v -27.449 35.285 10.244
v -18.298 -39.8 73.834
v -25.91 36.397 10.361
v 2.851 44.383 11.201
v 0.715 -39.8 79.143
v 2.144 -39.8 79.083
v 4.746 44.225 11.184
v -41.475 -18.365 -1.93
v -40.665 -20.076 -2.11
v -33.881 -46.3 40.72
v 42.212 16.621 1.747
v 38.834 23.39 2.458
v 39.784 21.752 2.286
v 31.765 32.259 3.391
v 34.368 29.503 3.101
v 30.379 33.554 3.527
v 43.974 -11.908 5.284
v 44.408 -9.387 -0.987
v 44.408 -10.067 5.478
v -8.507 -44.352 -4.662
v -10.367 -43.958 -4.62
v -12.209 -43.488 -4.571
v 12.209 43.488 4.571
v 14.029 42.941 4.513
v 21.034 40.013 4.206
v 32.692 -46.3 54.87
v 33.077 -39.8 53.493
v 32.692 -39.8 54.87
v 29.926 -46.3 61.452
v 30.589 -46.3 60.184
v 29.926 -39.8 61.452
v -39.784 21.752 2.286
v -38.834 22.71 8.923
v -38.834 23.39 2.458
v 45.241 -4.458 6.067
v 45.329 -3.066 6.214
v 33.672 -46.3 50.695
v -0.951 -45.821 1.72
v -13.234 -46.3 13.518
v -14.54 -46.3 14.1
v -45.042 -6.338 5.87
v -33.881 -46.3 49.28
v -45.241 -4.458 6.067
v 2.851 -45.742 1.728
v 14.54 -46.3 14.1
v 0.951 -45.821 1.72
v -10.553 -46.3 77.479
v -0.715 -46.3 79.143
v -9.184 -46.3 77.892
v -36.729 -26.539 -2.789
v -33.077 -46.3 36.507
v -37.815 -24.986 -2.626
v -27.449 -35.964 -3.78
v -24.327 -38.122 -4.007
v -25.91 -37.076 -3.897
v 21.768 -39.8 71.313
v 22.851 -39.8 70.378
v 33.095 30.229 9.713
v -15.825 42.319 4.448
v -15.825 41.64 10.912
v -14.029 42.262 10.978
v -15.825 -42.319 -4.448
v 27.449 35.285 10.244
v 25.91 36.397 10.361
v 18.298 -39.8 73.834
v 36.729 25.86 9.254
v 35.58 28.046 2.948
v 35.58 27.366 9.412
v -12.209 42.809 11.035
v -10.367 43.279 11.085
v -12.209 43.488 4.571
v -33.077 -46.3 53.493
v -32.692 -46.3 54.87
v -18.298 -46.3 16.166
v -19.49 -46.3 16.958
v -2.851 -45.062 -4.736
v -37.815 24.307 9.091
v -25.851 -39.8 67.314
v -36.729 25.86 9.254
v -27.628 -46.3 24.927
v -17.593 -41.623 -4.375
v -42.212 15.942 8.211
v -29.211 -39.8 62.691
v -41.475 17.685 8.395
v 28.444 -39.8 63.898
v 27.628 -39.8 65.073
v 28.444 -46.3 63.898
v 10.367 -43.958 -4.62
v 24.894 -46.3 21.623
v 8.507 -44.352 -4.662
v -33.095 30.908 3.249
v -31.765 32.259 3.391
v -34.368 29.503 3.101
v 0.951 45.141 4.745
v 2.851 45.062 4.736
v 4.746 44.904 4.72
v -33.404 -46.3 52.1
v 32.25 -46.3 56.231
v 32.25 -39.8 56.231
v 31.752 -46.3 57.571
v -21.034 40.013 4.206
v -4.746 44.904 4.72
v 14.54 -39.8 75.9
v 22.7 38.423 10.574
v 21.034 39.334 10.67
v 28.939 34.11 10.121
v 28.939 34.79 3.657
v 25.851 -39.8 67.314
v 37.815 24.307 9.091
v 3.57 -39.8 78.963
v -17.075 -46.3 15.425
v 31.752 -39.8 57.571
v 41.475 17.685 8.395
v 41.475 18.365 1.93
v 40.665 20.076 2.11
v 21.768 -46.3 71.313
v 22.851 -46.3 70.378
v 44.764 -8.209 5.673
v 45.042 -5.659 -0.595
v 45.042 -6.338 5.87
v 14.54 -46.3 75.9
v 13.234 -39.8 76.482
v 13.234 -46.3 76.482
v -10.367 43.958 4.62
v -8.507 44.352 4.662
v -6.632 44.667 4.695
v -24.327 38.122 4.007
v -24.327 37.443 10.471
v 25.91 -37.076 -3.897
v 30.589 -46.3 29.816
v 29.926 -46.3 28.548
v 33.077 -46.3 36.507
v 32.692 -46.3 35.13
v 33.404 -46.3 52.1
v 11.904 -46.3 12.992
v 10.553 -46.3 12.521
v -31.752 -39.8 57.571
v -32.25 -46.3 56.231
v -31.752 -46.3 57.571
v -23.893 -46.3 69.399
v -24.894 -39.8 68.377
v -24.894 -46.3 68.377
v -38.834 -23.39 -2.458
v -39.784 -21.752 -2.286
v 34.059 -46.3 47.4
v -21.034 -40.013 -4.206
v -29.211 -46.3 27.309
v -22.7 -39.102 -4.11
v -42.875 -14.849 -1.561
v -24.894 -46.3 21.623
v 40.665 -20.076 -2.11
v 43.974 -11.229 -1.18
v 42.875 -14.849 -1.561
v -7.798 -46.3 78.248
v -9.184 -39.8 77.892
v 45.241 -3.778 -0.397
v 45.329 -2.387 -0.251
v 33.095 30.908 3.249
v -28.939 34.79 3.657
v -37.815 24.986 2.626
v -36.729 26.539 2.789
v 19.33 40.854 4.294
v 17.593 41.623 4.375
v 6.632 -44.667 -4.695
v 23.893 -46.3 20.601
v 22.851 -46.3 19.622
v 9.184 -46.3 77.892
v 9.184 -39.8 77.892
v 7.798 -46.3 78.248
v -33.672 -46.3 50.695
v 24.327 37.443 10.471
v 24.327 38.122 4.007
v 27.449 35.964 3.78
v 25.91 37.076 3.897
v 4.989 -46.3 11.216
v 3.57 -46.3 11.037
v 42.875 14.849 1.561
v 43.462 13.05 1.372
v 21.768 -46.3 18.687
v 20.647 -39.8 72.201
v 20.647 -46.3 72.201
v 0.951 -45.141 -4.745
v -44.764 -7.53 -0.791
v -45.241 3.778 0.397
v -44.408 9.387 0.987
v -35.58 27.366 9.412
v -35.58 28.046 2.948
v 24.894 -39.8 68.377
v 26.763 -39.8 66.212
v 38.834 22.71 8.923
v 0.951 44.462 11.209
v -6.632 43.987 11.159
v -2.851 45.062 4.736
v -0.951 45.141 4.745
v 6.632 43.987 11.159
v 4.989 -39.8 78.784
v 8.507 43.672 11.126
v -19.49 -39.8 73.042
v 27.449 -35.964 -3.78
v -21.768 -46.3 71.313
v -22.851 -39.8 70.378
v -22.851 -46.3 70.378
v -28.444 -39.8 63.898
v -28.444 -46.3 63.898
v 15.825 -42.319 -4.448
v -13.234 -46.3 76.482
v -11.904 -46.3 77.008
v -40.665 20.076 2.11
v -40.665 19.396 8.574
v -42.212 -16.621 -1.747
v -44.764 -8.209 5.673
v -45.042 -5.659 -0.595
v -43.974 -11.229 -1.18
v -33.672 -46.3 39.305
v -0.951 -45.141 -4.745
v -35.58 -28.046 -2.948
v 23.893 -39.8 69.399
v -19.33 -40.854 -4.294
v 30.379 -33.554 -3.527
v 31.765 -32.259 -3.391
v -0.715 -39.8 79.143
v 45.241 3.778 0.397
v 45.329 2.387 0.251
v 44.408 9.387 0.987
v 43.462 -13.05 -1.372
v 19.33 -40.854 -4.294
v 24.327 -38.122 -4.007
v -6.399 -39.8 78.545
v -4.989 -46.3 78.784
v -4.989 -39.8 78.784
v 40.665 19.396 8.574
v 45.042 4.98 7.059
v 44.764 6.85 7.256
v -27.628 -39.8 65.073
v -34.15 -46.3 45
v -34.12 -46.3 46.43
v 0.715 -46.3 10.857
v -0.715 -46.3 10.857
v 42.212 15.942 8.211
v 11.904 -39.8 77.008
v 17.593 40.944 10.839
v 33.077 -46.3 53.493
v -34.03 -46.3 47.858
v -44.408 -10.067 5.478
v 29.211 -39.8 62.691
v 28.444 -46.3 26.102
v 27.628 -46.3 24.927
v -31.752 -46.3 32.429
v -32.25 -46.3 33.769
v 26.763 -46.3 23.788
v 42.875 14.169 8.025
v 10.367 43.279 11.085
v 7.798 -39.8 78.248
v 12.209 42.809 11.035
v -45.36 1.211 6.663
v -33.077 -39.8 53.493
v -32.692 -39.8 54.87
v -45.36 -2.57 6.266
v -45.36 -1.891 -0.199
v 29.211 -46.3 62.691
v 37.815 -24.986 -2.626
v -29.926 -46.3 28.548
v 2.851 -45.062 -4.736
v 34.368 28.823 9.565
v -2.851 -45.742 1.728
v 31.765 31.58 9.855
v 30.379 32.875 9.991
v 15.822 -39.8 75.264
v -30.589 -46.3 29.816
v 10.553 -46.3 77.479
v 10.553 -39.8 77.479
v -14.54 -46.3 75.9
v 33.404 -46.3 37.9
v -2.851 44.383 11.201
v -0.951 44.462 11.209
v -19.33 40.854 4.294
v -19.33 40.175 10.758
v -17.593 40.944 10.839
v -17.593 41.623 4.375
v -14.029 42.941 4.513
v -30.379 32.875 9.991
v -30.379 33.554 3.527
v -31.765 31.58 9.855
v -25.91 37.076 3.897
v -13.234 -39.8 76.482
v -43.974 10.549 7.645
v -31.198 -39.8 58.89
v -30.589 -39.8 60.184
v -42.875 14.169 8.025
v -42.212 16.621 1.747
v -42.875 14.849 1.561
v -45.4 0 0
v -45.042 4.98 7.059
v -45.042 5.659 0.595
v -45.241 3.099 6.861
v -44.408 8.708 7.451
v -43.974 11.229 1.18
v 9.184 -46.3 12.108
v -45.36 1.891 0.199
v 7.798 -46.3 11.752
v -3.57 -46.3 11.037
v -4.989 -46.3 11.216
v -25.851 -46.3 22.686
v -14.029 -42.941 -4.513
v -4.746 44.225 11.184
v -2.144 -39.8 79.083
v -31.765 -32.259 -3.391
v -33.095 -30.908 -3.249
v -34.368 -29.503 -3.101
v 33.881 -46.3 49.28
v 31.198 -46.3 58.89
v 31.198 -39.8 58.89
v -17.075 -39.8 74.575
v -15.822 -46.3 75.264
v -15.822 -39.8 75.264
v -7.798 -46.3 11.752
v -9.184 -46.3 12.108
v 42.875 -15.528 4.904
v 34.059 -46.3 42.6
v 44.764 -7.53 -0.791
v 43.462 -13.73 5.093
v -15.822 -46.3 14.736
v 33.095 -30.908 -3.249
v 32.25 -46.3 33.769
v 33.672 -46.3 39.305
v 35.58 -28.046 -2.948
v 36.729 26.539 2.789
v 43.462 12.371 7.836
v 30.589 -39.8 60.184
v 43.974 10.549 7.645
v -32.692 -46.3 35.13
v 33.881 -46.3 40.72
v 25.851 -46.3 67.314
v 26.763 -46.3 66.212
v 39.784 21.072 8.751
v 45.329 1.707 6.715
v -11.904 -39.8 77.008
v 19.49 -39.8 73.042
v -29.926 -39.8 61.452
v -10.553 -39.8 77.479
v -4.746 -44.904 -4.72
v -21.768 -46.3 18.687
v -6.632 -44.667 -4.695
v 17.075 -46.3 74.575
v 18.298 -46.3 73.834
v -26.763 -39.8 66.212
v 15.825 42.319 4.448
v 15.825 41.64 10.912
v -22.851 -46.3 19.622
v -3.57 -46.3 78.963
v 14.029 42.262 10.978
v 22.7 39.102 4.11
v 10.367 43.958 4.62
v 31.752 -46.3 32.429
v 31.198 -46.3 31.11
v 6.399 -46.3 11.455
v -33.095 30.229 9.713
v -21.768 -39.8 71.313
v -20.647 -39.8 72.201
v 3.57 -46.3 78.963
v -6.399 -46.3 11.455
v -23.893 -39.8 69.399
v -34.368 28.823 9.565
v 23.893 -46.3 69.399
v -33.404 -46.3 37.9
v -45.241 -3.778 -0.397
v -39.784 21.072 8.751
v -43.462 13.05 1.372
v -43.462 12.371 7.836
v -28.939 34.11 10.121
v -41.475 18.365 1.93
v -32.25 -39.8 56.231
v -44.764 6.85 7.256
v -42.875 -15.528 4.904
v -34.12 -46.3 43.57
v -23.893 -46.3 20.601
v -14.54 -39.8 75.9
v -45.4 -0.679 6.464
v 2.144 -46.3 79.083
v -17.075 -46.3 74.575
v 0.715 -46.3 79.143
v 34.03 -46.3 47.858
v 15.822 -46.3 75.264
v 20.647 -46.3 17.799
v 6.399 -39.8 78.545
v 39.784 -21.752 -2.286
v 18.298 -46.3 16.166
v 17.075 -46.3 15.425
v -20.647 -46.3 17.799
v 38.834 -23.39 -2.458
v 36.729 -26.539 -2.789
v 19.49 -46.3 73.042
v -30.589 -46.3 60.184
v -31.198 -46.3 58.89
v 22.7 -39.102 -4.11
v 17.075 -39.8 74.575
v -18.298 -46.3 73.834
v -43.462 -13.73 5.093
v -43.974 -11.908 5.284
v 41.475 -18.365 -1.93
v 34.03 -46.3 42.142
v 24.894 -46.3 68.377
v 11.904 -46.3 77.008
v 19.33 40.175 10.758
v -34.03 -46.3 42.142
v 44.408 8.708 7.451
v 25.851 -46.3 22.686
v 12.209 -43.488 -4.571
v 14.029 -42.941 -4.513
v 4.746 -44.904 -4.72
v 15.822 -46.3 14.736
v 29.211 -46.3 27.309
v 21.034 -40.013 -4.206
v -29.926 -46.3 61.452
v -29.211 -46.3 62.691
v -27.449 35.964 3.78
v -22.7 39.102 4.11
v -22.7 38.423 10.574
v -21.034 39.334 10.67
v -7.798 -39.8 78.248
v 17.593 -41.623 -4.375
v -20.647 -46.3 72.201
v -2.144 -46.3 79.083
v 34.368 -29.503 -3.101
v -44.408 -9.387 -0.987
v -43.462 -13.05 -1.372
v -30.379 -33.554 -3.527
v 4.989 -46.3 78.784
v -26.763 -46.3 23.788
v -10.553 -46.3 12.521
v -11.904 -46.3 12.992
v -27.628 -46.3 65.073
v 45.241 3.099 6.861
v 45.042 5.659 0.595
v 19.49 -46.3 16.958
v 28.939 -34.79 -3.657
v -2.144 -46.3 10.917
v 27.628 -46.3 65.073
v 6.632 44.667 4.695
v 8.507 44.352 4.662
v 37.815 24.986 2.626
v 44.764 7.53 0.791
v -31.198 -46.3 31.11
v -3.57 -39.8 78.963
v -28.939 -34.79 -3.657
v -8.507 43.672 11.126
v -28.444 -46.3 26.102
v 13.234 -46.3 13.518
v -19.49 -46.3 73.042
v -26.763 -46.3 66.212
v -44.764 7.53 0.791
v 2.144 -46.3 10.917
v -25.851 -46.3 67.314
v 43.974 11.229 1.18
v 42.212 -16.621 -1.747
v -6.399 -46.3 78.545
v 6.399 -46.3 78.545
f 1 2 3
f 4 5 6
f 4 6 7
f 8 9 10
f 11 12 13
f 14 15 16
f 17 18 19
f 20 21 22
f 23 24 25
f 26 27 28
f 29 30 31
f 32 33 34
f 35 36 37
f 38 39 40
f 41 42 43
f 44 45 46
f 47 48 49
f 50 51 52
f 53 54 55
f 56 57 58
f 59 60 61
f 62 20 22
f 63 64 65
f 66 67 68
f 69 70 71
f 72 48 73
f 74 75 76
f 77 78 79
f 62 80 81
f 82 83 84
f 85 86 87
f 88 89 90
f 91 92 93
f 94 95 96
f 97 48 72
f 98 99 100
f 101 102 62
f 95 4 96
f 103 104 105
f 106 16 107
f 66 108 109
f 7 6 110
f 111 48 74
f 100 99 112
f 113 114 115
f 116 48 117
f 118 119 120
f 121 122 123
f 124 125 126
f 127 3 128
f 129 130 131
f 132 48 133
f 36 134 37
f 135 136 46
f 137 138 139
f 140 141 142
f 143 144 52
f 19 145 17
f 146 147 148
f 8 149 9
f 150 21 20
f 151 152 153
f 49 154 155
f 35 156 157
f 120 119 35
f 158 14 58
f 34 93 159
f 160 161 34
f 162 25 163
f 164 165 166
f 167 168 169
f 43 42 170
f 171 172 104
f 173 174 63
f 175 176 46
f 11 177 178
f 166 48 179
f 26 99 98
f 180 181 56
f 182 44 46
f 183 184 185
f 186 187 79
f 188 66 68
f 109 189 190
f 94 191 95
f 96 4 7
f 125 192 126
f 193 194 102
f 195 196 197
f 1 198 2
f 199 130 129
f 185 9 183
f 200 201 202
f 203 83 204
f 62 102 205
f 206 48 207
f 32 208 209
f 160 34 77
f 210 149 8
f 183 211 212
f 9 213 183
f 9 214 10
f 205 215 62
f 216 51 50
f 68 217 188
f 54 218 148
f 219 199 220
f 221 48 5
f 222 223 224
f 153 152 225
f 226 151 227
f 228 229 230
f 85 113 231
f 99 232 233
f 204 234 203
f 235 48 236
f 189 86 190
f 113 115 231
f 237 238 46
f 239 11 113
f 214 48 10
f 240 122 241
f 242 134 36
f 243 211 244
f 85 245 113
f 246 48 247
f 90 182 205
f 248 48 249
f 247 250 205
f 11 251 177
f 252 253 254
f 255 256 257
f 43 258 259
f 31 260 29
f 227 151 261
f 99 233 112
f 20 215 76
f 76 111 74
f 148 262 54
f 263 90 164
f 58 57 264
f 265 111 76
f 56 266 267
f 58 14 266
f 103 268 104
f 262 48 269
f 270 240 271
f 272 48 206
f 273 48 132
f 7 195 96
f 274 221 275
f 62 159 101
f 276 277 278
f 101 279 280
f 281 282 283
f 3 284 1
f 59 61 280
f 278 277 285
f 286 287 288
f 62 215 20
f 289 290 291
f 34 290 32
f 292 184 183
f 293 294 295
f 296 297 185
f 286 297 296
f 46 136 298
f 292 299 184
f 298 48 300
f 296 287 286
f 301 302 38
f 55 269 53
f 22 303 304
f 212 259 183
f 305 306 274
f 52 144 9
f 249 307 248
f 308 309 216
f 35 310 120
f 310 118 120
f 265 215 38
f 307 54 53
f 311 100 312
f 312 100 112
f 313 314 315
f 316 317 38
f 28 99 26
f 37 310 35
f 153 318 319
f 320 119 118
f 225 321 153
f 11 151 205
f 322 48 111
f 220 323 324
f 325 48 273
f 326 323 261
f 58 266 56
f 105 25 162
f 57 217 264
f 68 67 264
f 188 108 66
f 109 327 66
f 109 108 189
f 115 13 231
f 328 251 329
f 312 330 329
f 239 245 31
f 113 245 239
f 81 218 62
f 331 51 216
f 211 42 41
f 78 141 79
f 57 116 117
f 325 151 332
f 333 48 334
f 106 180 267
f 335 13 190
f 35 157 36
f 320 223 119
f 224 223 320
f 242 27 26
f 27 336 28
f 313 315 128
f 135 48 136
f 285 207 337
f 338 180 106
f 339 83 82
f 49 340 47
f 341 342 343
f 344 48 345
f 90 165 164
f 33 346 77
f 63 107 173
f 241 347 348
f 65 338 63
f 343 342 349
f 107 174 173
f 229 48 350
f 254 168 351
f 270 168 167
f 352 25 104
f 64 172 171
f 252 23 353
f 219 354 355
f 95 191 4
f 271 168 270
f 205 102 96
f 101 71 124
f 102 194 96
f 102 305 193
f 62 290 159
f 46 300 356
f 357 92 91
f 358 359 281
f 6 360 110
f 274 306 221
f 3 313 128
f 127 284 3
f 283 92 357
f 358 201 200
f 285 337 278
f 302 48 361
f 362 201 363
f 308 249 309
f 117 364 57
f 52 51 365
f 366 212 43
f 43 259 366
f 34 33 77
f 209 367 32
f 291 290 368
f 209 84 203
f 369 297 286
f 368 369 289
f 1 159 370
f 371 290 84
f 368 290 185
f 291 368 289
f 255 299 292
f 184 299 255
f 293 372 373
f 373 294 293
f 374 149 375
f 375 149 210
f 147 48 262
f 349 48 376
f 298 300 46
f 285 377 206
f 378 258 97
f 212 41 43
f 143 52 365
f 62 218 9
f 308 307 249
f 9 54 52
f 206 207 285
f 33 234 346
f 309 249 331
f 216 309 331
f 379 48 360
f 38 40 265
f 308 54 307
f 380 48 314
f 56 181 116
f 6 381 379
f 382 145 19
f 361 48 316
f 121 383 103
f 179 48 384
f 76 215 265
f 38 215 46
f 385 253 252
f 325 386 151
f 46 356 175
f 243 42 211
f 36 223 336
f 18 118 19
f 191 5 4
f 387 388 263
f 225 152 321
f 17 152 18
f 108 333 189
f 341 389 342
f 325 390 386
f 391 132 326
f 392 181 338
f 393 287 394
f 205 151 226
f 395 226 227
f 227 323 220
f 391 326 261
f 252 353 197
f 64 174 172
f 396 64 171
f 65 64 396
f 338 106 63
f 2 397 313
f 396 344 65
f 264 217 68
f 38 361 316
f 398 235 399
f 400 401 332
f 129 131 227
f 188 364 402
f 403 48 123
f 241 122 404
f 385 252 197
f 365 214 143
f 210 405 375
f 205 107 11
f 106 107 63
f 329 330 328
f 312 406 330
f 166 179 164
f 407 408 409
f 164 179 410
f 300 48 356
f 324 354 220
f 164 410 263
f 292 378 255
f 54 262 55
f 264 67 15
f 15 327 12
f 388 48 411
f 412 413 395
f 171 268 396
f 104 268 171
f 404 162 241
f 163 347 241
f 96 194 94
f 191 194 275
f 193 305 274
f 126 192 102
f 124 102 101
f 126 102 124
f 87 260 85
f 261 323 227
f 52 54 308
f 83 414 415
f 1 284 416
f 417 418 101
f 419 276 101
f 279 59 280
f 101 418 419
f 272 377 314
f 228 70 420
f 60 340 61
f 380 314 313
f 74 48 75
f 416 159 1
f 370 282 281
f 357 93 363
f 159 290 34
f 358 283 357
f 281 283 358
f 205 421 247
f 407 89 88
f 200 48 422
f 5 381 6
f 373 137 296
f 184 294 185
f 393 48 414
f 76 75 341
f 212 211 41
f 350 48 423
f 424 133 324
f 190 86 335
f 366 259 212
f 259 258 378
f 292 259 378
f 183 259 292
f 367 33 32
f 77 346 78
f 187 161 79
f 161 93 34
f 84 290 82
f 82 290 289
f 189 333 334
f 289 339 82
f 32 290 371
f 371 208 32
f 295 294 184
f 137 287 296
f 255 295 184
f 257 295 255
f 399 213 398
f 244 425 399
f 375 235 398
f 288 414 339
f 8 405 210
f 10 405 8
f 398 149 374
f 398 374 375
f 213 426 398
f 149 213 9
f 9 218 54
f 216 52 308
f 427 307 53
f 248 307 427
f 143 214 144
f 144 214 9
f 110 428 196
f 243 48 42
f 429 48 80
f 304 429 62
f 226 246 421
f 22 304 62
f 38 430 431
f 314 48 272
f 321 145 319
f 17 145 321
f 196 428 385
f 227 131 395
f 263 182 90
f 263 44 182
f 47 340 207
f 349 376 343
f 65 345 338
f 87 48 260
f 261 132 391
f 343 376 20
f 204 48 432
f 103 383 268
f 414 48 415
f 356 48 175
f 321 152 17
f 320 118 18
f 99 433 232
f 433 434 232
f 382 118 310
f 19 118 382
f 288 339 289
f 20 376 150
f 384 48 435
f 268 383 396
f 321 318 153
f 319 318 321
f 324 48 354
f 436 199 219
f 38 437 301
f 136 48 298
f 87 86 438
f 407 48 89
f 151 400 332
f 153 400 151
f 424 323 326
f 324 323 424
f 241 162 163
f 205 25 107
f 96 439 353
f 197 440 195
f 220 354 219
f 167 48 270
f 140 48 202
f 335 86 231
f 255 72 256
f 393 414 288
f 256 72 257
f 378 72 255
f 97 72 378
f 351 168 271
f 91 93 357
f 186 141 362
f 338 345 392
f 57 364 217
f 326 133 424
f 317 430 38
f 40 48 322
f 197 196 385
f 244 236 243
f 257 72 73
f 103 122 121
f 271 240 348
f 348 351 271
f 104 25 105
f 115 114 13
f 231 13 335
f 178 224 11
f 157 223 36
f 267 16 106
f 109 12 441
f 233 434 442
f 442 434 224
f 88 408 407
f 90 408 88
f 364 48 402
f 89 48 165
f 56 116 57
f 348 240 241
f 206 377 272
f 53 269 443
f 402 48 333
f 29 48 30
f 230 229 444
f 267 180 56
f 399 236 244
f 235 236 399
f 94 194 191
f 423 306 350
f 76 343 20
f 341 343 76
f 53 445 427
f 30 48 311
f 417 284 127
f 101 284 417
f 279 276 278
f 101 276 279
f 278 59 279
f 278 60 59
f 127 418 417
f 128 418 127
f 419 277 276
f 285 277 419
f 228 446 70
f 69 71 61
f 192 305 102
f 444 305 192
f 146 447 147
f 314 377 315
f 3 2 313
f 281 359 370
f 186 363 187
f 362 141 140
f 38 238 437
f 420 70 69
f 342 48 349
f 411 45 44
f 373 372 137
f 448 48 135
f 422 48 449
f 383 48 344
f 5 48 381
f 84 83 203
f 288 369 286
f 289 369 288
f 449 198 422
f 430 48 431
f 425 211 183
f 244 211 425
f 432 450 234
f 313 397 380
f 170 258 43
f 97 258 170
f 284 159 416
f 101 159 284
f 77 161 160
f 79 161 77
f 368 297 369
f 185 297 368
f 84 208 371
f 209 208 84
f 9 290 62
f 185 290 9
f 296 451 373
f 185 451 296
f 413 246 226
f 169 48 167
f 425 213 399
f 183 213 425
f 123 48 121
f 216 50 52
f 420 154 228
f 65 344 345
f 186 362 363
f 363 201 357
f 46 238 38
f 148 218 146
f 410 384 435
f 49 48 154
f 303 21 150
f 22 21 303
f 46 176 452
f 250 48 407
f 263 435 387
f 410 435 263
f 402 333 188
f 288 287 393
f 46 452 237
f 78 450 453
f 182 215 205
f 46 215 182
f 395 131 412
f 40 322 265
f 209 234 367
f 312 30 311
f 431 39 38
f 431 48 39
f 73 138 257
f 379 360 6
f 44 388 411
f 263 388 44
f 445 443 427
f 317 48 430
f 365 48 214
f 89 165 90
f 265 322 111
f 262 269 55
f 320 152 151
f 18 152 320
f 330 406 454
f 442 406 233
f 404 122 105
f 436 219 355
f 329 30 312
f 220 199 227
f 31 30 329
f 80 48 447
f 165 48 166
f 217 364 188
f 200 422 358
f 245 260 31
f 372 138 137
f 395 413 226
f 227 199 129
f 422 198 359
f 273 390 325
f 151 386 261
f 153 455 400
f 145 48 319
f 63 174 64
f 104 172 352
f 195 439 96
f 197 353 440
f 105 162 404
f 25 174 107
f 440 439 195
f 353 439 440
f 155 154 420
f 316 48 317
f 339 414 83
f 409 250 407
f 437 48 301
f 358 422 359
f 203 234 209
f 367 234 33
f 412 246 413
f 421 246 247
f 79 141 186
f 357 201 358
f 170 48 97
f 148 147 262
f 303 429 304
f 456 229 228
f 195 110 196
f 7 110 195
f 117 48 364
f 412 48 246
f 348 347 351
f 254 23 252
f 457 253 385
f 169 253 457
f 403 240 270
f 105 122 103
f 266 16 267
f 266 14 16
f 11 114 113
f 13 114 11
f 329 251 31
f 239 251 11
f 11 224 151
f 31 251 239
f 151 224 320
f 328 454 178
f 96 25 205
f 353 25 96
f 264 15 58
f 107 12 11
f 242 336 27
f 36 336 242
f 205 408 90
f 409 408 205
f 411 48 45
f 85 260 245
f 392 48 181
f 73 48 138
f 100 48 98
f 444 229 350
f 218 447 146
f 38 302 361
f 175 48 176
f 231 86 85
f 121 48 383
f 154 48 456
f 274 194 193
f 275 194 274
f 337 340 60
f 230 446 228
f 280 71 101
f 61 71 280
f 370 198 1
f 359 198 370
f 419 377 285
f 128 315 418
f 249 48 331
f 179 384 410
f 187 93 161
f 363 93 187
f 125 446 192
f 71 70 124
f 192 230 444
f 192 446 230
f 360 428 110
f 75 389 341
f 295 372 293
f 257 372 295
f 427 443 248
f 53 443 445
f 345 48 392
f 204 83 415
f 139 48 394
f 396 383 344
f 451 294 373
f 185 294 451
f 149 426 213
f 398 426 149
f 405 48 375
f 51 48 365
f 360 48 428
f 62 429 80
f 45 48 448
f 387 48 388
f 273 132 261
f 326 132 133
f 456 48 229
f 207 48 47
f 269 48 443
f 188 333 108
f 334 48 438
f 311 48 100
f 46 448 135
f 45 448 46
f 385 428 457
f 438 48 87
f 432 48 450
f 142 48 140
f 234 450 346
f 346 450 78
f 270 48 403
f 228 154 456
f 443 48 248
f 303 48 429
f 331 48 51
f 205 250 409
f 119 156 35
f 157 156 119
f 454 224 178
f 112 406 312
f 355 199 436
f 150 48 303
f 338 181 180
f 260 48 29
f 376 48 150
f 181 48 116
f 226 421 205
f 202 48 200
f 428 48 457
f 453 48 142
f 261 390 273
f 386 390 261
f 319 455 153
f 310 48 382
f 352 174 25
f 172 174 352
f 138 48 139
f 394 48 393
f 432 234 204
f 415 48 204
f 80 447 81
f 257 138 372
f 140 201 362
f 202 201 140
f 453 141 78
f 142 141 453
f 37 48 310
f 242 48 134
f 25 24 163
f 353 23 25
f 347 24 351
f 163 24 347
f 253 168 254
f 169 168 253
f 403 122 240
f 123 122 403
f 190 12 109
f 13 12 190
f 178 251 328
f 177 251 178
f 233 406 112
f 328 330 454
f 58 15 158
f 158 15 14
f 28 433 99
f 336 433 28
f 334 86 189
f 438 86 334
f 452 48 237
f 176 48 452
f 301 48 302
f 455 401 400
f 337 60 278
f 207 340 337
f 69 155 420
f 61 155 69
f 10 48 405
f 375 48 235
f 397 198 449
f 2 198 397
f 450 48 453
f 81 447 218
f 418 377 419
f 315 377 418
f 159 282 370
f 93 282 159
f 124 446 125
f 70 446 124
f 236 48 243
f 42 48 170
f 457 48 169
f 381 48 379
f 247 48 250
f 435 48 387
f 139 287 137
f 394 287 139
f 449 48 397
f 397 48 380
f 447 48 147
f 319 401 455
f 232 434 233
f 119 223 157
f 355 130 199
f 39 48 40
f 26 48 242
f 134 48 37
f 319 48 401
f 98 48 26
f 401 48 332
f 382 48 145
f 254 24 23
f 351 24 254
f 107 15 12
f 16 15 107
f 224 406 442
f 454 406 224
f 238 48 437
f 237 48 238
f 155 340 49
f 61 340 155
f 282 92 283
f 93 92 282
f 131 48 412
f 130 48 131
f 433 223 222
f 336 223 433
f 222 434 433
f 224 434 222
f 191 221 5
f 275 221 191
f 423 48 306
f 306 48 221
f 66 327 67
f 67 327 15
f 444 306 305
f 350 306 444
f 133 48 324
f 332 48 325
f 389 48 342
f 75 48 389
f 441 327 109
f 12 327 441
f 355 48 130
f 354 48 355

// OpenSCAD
/** [Light Info] **/

diameter = 90;

height = 13;

cable_diam = 4;


/** [Other] **/

fn=150;

tolerance = 0.4;

$fn = fn;



module ring_profile_2d(diameter) {
    cable_clear = cable_diam + tolerance*2;
	difference()
    {
        circle(r = diameter/2+tolerance);

        translate([diameter/2-cable_clear/2, 0])
		union()
        {   
            translate([0, -cable_clear / 2])
            square([cable_clear, cable_clear]);
            circle(r = cable_clear / 2);
		}
	}
}

module profile(diameter) {
	linear_extrude(height = height/2, center = false)
		ring_profile_2d(diameter);
}

module led_wall_support() {
	hull()
    {
		translate([0,-diameter/3-9.8, diameter/2])
        rotate([90, 0, 0])
        profile(diameter*3/4);

        rotate([6, 0, 0])
        profile(diameter);
	}
}

led_wall_support();
